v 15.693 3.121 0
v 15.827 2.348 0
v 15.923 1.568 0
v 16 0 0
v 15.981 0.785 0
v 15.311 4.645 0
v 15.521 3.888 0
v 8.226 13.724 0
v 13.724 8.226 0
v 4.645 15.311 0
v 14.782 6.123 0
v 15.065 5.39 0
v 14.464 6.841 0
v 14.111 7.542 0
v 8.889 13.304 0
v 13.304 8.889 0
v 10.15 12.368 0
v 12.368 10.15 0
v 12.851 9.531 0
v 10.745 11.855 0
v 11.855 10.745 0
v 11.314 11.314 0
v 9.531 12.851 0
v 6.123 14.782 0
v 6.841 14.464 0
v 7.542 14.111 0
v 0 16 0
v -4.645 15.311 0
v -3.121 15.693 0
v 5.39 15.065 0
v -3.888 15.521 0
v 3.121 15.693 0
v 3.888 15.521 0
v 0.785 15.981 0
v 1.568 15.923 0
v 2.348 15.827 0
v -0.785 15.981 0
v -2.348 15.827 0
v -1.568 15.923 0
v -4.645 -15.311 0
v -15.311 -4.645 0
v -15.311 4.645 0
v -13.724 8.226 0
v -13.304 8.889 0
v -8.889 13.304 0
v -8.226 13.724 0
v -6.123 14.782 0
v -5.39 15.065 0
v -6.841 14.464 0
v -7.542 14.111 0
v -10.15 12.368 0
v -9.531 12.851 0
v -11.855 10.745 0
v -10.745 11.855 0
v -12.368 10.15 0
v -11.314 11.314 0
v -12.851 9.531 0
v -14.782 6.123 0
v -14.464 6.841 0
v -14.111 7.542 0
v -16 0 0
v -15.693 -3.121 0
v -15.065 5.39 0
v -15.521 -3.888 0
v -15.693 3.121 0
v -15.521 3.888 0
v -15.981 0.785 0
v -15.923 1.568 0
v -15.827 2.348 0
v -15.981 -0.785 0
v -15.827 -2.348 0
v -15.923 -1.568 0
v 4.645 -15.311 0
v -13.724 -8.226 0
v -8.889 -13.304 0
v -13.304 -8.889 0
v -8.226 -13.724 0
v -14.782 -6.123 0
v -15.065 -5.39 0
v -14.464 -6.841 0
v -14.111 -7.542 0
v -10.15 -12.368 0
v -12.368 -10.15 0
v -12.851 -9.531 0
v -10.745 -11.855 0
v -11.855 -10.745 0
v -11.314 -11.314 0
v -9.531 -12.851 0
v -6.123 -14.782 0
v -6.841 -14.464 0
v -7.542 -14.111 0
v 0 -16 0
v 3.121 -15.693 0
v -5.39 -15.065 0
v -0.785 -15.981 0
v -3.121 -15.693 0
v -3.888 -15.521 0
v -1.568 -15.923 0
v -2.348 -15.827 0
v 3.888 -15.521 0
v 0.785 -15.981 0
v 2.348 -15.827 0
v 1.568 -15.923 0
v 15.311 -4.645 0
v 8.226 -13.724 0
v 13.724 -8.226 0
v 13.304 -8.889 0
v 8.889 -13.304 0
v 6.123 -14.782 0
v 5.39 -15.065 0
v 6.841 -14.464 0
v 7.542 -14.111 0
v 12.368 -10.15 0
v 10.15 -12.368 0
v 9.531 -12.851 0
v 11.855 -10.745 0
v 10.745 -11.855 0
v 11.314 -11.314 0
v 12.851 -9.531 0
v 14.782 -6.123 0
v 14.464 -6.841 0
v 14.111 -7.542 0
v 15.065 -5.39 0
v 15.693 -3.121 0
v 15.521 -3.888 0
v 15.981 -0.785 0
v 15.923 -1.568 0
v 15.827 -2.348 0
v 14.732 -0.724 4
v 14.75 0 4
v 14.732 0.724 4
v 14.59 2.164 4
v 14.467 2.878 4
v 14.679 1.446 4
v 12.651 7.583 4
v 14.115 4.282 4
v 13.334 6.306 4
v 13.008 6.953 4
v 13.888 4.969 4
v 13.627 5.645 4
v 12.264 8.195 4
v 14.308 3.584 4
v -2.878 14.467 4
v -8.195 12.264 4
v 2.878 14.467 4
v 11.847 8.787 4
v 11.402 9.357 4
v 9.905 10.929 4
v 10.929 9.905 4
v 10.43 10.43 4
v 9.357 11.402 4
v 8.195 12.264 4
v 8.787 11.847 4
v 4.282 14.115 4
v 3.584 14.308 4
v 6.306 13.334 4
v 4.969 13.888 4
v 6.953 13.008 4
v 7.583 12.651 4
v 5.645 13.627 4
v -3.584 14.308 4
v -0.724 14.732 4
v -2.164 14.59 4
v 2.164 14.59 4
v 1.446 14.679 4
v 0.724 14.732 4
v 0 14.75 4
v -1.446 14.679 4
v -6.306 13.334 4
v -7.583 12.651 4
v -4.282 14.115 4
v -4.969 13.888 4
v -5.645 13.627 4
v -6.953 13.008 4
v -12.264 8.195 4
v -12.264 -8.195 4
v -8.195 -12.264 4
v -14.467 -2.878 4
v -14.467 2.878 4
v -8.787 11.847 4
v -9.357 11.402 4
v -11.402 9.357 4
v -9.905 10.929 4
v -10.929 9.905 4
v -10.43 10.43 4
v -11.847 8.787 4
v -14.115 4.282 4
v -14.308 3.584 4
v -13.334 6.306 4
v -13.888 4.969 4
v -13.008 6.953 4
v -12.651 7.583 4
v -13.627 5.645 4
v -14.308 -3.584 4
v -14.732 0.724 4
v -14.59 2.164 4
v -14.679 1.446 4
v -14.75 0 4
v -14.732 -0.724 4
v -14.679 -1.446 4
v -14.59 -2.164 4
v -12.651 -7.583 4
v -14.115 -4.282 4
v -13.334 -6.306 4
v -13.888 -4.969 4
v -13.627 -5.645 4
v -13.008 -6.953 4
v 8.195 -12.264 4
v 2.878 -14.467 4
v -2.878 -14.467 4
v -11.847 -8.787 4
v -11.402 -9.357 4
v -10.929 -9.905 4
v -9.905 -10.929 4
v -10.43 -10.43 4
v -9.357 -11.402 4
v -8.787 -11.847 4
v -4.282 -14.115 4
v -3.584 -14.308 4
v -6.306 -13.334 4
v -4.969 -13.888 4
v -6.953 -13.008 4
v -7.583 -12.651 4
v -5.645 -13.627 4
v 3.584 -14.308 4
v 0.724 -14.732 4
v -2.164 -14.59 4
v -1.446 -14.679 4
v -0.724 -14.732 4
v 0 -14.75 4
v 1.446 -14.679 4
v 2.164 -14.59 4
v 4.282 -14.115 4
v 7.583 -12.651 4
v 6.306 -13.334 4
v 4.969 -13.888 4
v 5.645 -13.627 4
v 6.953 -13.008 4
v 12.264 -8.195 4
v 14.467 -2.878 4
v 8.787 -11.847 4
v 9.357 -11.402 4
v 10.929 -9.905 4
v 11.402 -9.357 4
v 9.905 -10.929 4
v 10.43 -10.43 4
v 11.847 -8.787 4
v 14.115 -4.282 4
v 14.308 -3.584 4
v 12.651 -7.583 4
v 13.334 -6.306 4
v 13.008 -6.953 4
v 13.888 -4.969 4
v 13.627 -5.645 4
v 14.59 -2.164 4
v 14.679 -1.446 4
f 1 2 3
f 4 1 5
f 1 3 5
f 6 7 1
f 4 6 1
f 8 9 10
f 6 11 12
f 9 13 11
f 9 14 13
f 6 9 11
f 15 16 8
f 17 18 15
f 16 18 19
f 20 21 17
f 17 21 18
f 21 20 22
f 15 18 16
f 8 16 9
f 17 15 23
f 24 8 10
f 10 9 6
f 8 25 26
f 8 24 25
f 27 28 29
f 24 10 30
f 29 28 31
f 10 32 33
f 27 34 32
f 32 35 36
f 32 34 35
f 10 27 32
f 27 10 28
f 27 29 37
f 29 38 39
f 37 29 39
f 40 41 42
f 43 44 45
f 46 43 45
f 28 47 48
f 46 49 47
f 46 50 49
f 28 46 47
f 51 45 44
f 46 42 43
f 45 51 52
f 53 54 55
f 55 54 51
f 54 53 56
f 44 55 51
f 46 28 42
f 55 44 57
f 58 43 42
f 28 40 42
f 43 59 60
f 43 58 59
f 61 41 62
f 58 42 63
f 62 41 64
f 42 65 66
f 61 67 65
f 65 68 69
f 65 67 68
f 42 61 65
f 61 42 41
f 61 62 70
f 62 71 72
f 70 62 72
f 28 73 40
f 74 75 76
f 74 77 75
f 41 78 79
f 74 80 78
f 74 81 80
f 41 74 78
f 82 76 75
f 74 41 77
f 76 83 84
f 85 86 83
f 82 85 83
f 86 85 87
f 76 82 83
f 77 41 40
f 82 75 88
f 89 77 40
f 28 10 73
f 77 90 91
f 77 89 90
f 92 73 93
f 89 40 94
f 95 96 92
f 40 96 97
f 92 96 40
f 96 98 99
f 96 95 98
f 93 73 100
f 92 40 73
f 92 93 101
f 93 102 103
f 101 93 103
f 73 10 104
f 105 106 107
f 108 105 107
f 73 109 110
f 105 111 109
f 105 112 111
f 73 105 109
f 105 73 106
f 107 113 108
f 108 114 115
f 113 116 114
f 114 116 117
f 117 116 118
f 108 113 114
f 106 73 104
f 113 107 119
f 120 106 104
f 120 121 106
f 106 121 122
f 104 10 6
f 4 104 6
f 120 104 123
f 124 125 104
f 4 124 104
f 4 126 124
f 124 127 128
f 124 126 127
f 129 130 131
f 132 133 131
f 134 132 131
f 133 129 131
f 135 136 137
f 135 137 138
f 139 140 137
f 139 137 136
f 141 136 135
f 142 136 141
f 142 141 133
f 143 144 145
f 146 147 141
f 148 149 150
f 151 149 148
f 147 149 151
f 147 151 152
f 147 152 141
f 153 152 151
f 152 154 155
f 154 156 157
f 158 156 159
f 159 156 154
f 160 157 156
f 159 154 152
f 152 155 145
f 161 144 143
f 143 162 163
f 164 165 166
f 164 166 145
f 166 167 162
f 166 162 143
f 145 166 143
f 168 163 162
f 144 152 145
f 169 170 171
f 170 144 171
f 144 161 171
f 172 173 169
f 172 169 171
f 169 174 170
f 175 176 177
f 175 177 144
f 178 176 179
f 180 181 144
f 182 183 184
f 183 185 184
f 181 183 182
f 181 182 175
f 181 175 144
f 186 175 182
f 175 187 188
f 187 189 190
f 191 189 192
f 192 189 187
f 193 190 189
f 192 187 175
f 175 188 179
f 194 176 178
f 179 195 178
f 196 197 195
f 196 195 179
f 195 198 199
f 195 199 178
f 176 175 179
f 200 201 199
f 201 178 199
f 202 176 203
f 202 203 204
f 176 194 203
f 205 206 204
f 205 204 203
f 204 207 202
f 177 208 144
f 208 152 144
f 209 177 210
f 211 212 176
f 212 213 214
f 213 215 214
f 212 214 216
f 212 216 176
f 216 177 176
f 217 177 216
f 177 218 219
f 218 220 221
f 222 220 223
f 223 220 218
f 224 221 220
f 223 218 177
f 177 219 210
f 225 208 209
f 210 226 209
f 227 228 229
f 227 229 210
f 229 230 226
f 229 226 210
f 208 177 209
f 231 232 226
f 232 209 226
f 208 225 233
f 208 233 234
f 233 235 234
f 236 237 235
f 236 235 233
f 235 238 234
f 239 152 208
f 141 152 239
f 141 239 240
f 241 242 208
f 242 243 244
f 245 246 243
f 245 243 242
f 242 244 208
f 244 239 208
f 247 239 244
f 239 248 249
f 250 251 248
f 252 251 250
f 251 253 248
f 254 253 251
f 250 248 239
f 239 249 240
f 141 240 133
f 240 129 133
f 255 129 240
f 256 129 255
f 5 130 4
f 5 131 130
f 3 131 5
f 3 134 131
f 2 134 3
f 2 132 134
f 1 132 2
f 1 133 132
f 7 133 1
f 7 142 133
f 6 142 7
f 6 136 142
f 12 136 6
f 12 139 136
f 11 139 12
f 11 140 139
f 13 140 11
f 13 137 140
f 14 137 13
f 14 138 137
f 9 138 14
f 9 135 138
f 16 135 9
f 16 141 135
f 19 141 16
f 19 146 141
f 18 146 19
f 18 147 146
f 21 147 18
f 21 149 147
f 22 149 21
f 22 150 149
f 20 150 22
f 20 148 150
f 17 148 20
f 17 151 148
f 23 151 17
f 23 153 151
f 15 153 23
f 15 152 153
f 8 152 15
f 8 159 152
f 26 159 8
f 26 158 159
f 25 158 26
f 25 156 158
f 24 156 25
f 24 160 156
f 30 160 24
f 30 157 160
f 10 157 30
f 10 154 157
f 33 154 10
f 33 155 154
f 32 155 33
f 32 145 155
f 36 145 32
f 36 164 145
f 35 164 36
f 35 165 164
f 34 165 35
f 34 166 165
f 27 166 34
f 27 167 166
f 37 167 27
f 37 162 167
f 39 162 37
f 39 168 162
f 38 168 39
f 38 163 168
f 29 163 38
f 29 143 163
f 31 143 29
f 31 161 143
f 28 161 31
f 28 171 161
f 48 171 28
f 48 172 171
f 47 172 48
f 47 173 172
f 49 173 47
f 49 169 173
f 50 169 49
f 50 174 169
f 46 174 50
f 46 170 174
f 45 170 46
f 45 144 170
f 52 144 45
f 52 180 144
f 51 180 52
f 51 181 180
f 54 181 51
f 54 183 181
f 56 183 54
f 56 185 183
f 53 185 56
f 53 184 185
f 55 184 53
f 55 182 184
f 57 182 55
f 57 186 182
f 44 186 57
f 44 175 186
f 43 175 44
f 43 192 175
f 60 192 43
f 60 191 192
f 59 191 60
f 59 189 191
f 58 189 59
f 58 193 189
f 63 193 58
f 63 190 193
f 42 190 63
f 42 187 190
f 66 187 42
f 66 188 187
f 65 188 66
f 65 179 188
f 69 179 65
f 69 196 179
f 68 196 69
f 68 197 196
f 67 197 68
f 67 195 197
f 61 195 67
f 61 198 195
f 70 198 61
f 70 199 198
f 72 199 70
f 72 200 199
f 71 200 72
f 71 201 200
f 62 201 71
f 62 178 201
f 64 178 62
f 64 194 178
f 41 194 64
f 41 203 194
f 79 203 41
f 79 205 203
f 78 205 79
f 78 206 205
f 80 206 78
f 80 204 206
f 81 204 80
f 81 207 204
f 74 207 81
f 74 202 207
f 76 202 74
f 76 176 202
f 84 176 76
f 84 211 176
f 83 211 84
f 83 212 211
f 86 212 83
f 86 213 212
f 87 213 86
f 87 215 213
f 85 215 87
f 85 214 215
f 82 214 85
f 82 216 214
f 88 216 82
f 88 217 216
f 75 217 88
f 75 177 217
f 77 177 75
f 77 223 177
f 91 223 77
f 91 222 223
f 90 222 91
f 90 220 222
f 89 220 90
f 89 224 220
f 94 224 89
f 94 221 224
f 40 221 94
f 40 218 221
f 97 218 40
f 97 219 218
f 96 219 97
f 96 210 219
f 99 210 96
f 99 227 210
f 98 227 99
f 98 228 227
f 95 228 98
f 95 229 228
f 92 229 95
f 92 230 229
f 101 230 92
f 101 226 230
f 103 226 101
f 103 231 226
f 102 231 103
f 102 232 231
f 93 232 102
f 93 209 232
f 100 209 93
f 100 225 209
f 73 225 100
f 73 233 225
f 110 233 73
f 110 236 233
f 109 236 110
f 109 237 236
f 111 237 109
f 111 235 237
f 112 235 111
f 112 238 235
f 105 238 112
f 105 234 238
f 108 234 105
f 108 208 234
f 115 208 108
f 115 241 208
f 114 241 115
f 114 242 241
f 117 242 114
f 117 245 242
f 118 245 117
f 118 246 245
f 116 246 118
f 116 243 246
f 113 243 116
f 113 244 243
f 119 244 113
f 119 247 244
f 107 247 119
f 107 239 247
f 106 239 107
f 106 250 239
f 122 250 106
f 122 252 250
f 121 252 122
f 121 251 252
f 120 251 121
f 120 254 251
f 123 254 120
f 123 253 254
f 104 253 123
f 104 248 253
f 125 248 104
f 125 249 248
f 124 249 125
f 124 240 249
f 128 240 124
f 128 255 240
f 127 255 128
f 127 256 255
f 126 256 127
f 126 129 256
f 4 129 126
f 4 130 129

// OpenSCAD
/*
 * Warhammer base genrator
 * Not an official GW product
 *
 * Édouard Denommée
 * 2019-06-08
 */



// Length of the base
length = 32;
// Width of the base
width = 32;

// Height of the base
height = 4;
// Top of base inset
retraction = 2.5;

// Circle resolution
$fn = 128;





module CircularBase (size = [length, width, height], inset = retraction)
{
    linear_extrude (height = size[2], scale = [
        (size[0] - inset) / size[0],
        (size[1] - inset) / size[1] ])
    {
        scale ([size[0], size[1]])
        {
            circle(d=1);
        }
    }
}
CircularBase();
